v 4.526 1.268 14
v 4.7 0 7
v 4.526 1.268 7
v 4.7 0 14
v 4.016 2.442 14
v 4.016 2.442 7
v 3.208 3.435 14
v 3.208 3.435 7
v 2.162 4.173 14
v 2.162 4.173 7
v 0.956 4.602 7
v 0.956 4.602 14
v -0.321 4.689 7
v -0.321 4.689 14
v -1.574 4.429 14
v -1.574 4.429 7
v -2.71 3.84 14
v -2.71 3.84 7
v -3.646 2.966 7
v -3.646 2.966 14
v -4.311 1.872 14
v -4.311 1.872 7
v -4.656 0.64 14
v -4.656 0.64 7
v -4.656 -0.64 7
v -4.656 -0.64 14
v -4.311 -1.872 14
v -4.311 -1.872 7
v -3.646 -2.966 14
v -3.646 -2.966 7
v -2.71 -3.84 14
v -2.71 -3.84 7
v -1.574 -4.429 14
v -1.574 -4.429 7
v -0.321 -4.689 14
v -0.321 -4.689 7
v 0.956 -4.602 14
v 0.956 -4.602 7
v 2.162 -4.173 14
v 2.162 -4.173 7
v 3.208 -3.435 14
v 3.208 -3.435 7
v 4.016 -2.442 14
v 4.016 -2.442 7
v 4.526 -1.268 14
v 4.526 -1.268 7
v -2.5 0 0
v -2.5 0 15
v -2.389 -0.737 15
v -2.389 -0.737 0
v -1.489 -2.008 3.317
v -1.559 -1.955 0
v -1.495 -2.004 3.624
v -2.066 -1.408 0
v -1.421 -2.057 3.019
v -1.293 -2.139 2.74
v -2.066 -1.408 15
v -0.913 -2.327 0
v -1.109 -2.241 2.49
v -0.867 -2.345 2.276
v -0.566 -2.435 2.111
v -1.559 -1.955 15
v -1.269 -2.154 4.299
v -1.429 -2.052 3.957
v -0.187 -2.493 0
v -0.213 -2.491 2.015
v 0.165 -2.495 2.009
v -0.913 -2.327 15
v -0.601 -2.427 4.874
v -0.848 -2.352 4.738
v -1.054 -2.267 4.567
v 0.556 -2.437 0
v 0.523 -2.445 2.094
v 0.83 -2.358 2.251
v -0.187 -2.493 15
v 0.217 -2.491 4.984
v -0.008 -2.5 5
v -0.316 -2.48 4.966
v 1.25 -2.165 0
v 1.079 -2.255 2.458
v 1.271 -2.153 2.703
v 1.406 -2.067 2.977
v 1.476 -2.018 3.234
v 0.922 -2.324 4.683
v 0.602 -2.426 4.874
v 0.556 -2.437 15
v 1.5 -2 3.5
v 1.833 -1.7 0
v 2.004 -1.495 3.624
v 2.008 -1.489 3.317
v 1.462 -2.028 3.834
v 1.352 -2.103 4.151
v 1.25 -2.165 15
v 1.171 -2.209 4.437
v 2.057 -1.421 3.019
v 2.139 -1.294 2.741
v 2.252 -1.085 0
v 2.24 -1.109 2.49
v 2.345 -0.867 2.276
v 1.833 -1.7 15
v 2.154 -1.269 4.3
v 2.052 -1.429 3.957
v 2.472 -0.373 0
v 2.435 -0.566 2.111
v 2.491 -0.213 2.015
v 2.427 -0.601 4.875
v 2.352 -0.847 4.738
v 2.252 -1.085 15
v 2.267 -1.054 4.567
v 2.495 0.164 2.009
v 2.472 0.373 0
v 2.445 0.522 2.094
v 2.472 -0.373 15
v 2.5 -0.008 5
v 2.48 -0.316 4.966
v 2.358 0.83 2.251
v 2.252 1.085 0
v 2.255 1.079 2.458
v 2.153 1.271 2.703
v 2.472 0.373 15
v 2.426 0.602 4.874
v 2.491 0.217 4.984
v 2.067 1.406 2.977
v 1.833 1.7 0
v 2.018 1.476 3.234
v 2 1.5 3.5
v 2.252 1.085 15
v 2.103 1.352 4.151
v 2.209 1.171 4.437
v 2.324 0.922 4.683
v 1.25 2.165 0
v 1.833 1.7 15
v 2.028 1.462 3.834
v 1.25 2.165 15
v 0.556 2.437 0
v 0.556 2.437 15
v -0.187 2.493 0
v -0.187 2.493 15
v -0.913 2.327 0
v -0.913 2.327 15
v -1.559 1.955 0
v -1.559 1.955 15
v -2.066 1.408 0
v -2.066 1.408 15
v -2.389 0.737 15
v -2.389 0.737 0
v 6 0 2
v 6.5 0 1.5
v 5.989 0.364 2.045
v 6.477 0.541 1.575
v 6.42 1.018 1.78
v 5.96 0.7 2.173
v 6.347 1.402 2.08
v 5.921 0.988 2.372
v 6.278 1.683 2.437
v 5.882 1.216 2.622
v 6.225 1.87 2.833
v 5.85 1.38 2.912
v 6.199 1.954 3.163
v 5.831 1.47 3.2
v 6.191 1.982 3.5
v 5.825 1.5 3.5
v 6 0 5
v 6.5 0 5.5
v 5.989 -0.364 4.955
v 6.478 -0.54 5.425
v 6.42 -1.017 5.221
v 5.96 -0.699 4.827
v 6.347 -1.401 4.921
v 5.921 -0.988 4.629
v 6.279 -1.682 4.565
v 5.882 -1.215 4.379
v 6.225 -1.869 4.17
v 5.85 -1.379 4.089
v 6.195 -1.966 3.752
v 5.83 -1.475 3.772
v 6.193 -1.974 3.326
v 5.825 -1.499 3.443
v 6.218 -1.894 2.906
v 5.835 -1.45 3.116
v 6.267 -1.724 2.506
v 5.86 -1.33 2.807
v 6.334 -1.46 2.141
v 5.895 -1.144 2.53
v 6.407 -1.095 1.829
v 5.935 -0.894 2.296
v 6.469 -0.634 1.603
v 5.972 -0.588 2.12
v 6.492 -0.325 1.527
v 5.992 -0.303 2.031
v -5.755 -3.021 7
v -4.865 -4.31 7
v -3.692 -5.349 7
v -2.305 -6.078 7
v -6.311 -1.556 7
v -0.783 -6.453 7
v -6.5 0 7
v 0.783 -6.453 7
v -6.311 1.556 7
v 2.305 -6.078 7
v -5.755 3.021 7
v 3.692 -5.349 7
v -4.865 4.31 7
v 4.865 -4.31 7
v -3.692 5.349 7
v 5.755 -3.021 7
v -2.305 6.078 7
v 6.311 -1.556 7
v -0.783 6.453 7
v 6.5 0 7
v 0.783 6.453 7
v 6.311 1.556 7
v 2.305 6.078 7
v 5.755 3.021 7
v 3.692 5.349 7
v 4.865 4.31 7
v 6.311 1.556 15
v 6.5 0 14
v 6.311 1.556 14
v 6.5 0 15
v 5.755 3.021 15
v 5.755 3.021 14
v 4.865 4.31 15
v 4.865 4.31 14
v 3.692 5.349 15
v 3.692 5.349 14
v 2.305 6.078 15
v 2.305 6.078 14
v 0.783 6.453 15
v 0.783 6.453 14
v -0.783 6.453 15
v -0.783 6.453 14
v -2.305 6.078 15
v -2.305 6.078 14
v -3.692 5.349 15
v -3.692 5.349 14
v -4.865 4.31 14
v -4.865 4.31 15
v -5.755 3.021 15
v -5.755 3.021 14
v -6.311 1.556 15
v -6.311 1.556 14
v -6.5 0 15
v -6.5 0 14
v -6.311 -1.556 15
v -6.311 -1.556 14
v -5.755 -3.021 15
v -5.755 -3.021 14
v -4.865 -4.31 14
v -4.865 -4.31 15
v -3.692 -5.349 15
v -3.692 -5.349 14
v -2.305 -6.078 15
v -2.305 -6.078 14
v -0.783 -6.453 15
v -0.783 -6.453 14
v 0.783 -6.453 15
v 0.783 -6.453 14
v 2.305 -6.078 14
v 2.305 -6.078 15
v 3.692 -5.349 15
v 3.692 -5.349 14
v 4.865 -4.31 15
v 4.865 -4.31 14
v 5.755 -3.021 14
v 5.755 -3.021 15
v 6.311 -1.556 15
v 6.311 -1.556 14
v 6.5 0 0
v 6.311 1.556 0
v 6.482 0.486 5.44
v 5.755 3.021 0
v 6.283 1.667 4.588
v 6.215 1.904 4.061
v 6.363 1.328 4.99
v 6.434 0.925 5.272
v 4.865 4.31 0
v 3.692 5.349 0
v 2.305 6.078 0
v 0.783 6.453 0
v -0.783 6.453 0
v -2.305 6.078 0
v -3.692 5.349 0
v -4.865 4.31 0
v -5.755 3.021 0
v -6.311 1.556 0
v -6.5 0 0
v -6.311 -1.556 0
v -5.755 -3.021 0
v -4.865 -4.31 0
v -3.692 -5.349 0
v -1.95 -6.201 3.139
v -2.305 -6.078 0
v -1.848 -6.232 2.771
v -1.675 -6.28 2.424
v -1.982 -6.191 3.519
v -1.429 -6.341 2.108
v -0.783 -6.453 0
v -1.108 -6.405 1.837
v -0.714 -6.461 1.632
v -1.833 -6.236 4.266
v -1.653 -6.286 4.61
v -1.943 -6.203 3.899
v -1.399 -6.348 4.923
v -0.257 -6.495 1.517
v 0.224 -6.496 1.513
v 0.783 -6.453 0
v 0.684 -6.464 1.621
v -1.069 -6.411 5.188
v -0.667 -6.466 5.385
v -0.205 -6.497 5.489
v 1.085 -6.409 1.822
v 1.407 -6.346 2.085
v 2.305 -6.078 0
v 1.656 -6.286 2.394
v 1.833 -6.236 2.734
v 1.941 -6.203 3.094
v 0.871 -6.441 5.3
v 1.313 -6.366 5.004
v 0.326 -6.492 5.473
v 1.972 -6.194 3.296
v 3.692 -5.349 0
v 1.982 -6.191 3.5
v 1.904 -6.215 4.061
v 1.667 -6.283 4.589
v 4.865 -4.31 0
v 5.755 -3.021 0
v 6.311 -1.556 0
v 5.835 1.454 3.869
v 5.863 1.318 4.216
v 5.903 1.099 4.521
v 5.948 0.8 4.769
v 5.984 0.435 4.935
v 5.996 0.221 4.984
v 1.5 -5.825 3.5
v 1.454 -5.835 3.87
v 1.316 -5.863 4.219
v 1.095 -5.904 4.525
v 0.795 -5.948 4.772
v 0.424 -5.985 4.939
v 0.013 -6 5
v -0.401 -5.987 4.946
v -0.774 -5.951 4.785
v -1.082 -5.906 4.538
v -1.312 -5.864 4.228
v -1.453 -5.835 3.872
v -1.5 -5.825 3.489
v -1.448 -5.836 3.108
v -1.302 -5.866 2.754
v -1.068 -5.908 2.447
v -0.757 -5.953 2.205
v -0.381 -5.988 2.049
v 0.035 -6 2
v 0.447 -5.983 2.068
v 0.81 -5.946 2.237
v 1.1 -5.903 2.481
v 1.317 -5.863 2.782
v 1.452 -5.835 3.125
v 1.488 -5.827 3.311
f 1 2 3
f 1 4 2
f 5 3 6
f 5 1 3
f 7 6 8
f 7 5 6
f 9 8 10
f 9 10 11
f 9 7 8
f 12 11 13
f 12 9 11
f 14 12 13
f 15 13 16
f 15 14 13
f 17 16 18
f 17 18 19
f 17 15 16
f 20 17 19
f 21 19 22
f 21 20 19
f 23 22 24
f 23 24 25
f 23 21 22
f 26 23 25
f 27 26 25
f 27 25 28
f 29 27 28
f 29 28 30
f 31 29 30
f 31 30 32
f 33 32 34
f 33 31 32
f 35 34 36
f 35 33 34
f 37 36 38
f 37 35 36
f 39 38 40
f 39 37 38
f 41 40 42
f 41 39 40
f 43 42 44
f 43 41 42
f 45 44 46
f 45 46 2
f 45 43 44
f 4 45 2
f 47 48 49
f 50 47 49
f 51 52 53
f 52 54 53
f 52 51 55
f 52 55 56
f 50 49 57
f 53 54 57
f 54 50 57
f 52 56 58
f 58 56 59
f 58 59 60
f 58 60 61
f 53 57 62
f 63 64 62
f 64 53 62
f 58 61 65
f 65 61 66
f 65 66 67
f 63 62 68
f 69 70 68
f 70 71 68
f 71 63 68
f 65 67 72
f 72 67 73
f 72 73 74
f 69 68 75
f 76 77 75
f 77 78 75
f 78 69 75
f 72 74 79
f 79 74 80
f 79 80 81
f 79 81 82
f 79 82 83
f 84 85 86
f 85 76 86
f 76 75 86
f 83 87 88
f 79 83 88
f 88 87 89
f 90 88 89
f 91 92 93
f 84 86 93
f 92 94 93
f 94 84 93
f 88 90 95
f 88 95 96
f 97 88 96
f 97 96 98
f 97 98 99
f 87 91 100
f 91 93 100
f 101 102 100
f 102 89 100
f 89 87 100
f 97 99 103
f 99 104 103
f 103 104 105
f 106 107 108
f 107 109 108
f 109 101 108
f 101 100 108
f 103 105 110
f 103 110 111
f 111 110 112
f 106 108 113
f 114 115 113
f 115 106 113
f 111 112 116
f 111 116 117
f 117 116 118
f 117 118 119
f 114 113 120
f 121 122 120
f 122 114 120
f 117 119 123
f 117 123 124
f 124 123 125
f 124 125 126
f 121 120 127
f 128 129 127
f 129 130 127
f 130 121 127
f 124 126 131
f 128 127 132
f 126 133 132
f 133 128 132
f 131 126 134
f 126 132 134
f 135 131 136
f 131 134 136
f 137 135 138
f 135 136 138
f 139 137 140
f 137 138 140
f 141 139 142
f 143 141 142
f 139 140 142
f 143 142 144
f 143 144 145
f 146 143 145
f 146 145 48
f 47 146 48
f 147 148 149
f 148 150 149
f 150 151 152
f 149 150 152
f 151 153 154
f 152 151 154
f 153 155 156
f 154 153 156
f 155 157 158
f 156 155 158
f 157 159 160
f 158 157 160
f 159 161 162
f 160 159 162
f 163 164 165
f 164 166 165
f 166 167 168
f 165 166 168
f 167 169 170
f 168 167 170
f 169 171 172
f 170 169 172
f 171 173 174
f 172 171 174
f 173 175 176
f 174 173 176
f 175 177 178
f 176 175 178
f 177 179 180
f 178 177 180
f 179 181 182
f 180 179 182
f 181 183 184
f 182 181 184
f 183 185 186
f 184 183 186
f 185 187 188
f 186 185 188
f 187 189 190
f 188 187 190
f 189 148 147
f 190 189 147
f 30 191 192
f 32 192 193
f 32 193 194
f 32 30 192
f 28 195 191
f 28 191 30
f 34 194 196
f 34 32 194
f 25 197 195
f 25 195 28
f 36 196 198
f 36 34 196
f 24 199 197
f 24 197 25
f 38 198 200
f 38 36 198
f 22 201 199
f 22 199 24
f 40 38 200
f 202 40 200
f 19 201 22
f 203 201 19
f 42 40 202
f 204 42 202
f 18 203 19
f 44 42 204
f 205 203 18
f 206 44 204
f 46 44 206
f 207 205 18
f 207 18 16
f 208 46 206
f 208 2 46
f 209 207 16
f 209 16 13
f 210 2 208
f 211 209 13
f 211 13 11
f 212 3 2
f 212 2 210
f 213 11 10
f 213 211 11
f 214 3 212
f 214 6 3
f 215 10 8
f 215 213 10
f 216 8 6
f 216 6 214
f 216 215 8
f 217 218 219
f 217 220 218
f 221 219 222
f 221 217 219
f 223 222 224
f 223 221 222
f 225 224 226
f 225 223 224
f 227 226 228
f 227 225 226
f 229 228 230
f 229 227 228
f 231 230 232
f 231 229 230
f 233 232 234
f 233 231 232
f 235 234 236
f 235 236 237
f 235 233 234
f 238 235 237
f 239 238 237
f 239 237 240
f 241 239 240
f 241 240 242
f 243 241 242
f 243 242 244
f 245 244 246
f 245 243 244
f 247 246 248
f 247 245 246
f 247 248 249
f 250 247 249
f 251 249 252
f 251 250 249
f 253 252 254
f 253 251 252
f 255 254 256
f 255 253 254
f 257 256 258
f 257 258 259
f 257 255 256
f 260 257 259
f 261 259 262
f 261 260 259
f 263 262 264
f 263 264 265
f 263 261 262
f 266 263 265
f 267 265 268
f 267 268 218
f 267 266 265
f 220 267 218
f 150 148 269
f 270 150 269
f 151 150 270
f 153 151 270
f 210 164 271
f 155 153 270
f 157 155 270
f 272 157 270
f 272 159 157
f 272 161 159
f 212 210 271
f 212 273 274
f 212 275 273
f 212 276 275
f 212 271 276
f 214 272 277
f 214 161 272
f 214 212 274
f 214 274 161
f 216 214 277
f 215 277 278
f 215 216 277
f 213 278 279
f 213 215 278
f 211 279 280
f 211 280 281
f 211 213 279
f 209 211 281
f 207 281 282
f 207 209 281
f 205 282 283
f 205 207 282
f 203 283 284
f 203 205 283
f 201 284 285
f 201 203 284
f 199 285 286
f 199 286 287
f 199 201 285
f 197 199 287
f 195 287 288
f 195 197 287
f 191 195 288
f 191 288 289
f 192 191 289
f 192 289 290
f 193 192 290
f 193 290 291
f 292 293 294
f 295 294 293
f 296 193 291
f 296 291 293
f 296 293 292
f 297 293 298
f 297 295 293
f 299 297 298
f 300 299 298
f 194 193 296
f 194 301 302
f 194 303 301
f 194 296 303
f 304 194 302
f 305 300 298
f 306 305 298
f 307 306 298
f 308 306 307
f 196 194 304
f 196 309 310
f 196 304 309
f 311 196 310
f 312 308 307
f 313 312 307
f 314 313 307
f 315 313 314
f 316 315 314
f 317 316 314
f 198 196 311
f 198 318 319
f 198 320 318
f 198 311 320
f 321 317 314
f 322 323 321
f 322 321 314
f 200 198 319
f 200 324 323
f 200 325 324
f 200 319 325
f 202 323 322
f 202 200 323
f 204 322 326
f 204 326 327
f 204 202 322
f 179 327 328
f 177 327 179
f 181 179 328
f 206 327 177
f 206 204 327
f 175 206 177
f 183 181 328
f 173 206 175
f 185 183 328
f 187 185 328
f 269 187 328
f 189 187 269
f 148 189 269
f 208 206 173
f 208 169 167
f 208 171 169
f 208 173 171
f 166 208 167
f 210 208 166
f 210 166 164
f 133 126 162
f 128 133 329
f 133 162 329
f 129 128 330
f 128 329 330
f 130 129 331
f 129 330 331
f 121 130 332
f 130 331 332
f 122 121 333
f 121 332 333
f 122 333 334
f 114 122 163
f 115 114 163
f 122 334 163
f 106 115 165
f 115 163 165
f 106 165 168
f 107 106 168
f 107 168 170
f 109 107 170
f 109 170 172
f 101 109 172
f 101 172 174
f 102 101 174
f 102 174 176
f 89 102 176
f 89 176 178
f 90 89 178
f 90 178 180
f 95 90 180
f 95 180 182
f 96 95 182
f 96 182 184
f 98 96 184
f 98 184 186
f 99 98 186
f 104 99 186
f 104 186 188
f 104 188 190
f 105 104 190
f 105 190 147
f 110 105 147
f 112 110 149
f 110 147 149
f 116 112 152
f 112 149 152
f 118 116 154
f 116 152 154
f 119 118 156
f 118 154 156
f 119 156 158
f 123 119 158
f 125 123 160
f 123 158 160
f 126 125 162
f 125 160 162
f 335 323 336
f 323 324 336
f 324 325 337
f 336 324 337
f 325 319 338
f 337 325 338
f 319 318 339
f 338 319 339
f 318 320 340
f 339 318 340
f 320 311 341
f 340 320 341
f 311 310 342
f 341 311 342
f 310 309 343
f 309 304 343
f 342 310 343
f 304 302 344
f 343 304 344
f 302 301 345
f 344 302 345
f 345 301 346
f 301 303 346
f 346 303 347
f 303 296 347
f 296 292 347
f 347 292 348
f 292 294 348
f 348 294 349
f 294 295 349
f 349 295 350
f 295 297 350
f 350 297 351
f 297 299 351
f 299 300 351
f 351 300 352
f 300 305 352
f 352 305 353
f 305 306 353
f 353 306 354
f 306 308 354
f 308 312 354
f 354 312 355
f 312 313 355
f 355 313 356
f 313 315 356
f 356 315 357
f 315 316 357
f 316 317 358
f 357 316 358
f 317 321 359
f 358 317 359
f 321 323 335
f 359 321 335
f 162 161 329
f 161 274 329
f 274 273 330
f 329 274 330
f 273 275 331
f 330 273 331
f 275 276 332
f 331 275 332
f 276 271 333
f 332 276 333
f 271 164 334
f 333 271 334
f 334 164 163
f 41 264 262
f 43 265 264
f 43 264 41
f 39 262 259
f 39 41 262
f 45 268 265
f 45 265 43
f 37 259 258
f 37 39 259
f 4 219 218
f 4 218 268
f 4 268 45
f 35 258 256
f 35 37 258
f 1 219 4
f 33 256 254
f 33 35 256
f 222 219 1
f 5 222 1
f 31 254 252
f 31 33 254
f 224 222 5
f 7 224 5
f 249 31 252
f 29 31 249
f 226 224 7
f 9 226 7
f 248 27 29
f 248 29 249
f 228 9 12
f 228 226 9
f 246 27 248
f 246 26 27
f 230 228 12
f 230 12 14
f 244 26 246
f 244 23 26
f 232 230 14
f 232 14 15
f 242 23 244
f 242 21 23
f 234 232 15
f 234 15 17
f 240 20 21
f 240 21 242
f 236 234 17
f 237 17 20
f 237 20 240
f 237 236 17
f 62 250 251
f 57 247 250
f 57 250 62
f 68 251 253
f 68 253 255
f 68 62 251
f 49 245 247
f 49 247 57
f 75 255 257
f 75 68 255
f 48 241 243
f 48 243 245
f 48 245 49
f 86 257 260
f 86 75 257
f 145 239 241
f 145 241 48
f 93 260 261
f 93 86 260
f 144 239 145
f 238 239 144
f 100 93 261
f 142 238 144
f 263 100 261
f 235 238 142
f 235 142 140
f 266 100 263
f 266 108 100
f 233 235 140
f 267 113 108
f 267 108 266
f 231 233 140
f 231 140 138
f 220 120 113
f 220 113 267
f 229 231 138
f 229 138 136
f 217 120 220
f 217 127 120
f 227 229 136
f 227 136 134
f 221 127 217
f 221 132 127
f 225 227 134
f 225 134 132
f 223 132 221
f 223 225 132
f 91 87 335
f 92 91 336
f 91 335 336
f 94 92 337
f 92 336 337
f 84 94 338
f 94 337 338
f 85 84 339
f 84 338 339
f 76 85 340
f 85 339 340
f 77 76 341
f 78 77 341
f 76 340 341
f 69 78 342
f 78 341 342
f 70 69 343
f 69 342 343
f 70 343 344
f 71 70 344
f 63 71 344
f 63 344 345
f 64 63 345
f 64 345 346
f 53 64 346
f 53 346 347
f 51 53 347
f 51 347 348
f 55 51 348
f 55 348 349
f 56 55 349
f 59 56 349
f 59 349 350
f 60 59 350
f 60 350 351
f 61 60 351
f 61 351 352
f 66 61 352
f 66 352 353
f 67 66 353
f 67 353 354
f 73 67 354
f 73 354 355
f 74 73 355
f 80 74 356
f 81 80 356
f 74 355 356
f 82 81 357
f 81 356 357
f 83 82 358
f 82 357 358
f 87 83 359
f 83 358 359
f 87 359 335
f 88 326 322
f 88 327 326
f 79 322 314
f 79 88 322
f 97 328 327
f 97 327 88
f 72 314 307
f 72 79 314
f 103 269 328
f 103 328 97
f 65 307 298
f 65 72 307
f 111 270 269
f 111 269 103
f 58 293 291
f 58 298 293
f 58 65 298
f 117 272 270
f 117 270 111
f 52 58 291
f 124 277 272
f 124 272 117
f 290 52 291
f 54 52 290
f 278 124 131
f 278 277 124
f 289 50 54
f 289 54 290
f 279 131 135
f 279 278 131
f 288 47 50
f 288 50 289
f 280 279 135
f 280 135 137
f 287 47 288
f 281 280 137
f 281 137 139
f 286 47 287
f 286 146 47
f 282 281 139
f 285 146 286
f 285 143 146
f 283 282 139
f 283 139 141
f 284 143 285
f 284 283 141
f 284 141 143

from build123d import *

# Parameters (mm, degrees)
SKETCH003_R     = 1.5
PAD010_DEPTH    = 8
SKETCH017_R     = 1.5
PAD009_DEPTH    = 8
SKETCH016_R     = 2.5
POCKET001_DEPTH = 15
CHAMFER005_SIZE = 0.5


with BuildPart() as pad010:
    # Sketch003 → Pad010 (new body)
    with BuildSketch(Plane(origin=(7, 0, 3.5), x_dir=(0, 1, 0), z_dir=(1, 0, 0))):
        Circle(SKETCH003_R)
    extrude(amount=-PAD010_DEPTH)


with BuildPart() as pad009:
    # Sketch017 → Pad009 (new body)
    with BuildSketch(Plane(origin=(0, -7, 3.5), x_dir=(1, 0, 0), z_dir=(0, -1, 0))):
        Circle(SKETCH017_R)
    extrude(amount=-PAD009_DEPTH)


with BuildPart() as chamfer005:
    # Sketch015 → Revolution (revolve)
    with BuildSketch(Plane.XZ):
        Polygon((0, 0), (6.5, 0), (6.5, 7), (4.7, 7), (4.7, 14), (6.5, 14), (6.5, 15), (0, 15), align=None)
    revolve(axis=Axis((0, 0, 0), (0, 0, 1)))

    # Sketch016 (on Face7 of Revolution) → Pocket001 (cut)
    with BuildSketch(Plane(origin=(0, 0, 15), x_dir=(-1, 0, 0), z_dir=(0, 0, 1))):
        Circle(SKETCH016_R)
    extrude(amount=-POCKET001_DEPTH, mode=Mode.SUBTRACT)

    # Cut013: cut Pad009
    add(pad009.part, mode=Mode.SUBTRACT)

    # Cut014: cut Pad010
    add(pad010.part, mode=Mode.SUBTRACT)

    # Chamfer005
    chamfer005_edges = [chamfer005.edges().sort_by_distance(p)[0] for p in [
        (-4e-06, -6.499997, 4.999986),
        (-4e-06, -6.499997, 2.000014),
        (6.412872, 1.060693, 4.560627),
        (6.412872, 1.060693, 2.439373),
        (6.412872, -1.060693, 2.439373),
        (6.412872, -1.060693, 4.560627),
    ]]
    chamfer(chamfer005_edges, length=CHAMFER005_SIZE)


solid = chamfer005.part
